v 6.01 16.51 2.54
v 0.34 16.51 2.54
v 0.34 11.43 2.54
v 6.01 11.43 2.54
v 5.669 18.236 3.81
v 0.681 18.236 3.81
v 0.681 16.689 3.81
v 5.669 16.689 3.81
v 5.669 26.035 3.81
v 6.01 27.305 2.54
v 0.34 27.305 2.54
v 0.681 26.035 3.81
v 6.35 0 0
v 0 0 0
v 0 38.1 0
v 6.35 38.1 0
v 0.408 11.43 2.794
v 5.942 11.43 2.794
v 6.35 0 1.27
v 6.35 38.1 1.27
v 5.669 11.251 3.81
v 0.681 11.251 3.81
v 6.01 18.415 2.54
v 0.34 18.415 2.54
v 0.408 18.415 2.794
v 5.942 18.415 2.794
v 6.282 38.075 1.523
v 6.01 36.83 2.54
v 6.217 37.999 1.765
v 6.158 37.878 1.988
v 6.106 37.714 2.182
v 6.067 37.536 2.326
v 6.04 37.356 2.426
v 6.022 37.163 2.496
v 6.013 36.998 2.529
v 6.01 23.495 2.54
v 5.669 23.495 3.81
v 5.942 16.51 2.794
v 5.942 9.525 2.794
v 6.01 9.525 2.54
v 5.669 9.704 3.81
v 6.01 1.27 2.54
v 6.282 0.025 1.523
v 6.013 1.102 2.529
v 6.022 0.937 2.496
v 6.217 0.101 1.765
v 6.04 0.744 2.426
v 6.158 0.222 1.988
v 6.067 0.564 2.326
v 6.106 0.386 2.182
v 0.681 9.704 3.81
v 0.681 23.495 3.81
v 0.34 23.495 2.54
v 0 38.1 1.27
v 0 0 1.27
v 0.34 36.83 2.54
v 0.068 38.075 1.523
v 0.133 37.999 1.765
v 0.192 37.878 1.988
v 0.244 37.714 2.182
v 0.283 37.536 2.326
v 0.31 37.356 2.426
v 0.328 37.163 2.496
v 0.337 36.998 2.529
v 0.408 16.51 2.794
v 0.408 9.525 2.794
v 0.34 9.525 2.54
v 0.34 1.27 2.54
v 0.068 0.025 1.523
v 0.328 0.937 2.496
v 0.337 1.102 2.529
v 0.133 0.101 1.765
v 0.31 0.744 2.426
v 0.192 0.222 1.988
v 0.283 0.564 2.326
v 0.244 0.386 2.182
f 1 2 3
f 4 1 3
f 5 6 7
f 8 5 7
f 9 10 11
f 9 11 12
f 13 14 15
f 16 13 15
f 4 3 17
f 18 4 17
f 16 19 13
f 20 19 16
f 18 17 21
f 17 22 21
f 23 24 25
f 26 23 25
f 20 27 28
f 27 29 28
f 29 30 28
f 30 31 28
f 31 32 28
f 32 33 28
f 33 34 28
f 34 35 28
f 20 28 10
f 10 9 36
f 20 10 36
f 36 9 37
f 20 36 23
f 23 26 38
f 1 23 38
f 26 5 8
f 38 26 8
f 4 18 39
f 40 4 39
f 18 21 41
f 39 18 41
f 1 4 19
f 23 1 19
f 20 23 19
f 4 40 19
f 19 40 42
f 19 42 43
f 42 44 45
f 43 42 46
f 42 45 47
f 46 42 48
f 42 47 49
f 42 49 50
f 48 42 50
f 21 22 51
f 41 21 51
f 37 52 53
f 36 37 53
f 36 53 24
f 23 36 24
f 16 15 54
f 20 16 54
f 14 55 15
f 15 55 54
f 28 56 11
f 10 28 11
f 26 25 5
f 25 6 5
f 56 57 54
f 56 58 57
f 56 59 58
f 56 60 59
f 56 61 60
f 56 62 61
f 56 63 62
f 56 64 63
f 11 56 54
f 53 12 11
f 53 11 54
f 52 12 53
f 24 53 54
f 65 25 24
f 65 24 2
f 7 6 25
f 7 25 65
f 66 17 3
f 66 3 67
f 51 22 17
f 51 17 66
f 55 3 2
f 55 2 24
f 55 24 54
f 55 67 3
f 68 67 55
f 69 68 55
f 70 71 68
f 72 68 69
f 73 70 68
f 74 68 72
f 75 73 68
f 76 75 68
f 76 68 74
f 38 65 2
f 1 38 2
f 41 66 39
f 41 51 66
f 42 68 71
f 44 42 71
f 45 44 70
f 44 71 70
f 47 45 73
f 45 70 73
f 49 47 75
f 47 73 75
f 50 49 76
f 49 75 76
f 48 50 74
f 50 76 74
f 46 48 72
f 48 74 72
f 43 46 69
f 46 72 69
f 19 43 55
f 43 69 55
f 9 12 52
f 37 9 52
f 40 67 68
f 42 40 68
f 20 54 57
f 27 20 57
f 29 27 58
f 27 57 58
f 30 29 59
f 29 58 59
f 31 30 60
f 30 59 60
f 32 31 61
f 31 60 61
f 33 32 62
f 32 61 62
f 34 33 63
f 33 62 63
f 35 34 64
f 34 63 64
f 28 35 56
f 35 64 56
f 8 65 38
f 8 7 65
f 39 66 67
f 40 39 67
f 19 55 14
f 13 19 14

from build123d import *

# Parameters (mm, degrees)
F1_DEPTH    = 6.35
F2_SIZE2    = 0.1791482124
F2_SIZE     = 1.016
F2_2_SIZE2  = 0.1791482124
F2_2_SIZE   = 1.016
F2_3_SIZE2  = 0.1791482124
F2_3_SIZE   = 1.016
F3_SIZE2    = 0.1791482124
F3_SIZE     = 1.016
F4_SIZE2    = 0.6805909488
F4_SIZE     = 2.54
F5_SIZE2    = 0.6805909488
F5_SIZE     = 2.54
F6_T4_DEPTH = 18.0529676813


# Not quite as in the source:
# - a fillet or chamfer that OpenCascade refuses, or shapes differently, is made with other operations: its cross-section is extruded or revolved along the edge and cut away or added


with BuildPart() as f1:
    # F0 (on Right) → F1 (new body)
    with BuildSketch(Plane.YZ):
        with BuildLine():
            Line((0, 1.27), (0, 0))
            Line((0, 0), (38.1, 0))
            Line((38.1, 0), (38.1, 1.27))
            ThreePointArc((38.1, 1.27), (37.7280256121, 2.1680256121), (36.83, 2.54))
            Line((36.83, 2.54), (28.575, 2.54))
            Line((28.575, 2.54), (28.575, 3.81))
            Line((28.575, 3.81), (23.495, 3.81))
            Line((23.495, 3.81), (23.495, 2.54))
            Line((23.495, 2.54), (18.415, 2.54))
            Line((18.415, 2.54), (18.415, 3.81))
            Line((18.415, 3.81), (16.51, 3.81))
            Line((16.51, 3.81), (16.51, 2.54))
            Line((16.51, 2.54), (11.43, 2.54))
            Line((11.43, 2.54), (11.43, 3.81))
            Line((11.43, 3.81), (9.525, 3.81))
            Line((9.525, 3.81), (9.525, 2.54))
            Line((9.525, 2.54), (1.27, 2.54))
            ThreePointArc((1.27, 2.54), (0.3719743879, 2.1680256121), (0, 1.27))
        make_face()
    extrude(amount=F1_DEPTH)

    # F2
    f2_edges = [f1.edges().sort_by_distance(p)[0] for p in [
        (3.175, 11.43, 3.81),
    ]]
    f2_side = f1.faces().sort_by_distance((3.175, 11.43, 3.175))[0]
    chamfer(f2_edges, length=F2_SIZE, length2=F2_SIZE2, reference=f2_side)

    # F2#2
    f2_2_edges = [f1.edges().sort_by_distance(p)[0] for p in [
        (3.175, 9.525, 3.81),
    ]]
    f2_2_side = f1.faces().sort_by_distance((3.175, 9.525, 3.175))[0]
    chamfer(f2_2_edges, length=F2_2_SIZE, length2=F2_2_SIZE2, reference=f2_2_side)

    # F2#3
    f2_3_edges = [f1.edges().sort_by_distance(p)[0] for p in [
        (3.175, 18.415, 3.81),
    ]]
    f2_3_side = f1.faces().sort_by_distance((3.175, 18.415, 3.175))[0]
    chamfer(f2_3_edges, length=F2_3_SIZE, length2=F2_3_SIZE2, reference=f2_3_side)

    # F3
    f3_edges = [f1.edges().sort_by_distance(p)[0] for p in [
        (3.175, 16.51, 3.81),
    ]]
    f3_side = f1.faces().sort_by_distance((3.175, 16.51, 3.175))[0]
    chamfer(f3_edges, length=F3_SIZE, length2=F3_SIZE2, reference=f3_side)

    # F4
    f4_edges = [f1.edges().sort_by_distance(p)[0] for p in [
        (6.35, 10.4775, 3.81),
    ]]
    f4_side = f1.faces().sort_by_distance((6.35, 19.258705, 1.457125))[0]
    chamfer(f4_edges, length=F4_SIZE, length2=F4_SIZE2, reference=f4_side)

    # F5
    f5_edges = [f1.edges().sort_by_distance(p)[0] for p in [
        (0, 17.4625, 3.81),
    ]]
    f5_side = f1.faces().sort_by_distance((0, 19.258705, 1.457125))[0]
    chamfer(f5_edges, length=F5_SIZE, length2=F5_SIZE2, reference=f5_side)

    # F6: chamfer of 2.54 on 1 edges, made by hand


with BuildPart() as f6_tool2:
    # F6_s3 → F6_t4 (new body)
    with BuildSketch(Plane.YZ.offset(-5.8514838407)):
        Polygon((28.575, 1.27), (26.035, 3.81), (28.575, 3.81), align=None)
    extrude(amount=F6_T4_DEPTH)

    split(bisect_by=Plane.XY.offset(2.54), keep=Keep.TOP)


with BuildPart() as f1_1:
    add(f1.part)

    # F6_t1: cut F6_tool2
    add(f6_tool2.part, mode=Mode.SUBTRACT)


solid = f1_1.part
